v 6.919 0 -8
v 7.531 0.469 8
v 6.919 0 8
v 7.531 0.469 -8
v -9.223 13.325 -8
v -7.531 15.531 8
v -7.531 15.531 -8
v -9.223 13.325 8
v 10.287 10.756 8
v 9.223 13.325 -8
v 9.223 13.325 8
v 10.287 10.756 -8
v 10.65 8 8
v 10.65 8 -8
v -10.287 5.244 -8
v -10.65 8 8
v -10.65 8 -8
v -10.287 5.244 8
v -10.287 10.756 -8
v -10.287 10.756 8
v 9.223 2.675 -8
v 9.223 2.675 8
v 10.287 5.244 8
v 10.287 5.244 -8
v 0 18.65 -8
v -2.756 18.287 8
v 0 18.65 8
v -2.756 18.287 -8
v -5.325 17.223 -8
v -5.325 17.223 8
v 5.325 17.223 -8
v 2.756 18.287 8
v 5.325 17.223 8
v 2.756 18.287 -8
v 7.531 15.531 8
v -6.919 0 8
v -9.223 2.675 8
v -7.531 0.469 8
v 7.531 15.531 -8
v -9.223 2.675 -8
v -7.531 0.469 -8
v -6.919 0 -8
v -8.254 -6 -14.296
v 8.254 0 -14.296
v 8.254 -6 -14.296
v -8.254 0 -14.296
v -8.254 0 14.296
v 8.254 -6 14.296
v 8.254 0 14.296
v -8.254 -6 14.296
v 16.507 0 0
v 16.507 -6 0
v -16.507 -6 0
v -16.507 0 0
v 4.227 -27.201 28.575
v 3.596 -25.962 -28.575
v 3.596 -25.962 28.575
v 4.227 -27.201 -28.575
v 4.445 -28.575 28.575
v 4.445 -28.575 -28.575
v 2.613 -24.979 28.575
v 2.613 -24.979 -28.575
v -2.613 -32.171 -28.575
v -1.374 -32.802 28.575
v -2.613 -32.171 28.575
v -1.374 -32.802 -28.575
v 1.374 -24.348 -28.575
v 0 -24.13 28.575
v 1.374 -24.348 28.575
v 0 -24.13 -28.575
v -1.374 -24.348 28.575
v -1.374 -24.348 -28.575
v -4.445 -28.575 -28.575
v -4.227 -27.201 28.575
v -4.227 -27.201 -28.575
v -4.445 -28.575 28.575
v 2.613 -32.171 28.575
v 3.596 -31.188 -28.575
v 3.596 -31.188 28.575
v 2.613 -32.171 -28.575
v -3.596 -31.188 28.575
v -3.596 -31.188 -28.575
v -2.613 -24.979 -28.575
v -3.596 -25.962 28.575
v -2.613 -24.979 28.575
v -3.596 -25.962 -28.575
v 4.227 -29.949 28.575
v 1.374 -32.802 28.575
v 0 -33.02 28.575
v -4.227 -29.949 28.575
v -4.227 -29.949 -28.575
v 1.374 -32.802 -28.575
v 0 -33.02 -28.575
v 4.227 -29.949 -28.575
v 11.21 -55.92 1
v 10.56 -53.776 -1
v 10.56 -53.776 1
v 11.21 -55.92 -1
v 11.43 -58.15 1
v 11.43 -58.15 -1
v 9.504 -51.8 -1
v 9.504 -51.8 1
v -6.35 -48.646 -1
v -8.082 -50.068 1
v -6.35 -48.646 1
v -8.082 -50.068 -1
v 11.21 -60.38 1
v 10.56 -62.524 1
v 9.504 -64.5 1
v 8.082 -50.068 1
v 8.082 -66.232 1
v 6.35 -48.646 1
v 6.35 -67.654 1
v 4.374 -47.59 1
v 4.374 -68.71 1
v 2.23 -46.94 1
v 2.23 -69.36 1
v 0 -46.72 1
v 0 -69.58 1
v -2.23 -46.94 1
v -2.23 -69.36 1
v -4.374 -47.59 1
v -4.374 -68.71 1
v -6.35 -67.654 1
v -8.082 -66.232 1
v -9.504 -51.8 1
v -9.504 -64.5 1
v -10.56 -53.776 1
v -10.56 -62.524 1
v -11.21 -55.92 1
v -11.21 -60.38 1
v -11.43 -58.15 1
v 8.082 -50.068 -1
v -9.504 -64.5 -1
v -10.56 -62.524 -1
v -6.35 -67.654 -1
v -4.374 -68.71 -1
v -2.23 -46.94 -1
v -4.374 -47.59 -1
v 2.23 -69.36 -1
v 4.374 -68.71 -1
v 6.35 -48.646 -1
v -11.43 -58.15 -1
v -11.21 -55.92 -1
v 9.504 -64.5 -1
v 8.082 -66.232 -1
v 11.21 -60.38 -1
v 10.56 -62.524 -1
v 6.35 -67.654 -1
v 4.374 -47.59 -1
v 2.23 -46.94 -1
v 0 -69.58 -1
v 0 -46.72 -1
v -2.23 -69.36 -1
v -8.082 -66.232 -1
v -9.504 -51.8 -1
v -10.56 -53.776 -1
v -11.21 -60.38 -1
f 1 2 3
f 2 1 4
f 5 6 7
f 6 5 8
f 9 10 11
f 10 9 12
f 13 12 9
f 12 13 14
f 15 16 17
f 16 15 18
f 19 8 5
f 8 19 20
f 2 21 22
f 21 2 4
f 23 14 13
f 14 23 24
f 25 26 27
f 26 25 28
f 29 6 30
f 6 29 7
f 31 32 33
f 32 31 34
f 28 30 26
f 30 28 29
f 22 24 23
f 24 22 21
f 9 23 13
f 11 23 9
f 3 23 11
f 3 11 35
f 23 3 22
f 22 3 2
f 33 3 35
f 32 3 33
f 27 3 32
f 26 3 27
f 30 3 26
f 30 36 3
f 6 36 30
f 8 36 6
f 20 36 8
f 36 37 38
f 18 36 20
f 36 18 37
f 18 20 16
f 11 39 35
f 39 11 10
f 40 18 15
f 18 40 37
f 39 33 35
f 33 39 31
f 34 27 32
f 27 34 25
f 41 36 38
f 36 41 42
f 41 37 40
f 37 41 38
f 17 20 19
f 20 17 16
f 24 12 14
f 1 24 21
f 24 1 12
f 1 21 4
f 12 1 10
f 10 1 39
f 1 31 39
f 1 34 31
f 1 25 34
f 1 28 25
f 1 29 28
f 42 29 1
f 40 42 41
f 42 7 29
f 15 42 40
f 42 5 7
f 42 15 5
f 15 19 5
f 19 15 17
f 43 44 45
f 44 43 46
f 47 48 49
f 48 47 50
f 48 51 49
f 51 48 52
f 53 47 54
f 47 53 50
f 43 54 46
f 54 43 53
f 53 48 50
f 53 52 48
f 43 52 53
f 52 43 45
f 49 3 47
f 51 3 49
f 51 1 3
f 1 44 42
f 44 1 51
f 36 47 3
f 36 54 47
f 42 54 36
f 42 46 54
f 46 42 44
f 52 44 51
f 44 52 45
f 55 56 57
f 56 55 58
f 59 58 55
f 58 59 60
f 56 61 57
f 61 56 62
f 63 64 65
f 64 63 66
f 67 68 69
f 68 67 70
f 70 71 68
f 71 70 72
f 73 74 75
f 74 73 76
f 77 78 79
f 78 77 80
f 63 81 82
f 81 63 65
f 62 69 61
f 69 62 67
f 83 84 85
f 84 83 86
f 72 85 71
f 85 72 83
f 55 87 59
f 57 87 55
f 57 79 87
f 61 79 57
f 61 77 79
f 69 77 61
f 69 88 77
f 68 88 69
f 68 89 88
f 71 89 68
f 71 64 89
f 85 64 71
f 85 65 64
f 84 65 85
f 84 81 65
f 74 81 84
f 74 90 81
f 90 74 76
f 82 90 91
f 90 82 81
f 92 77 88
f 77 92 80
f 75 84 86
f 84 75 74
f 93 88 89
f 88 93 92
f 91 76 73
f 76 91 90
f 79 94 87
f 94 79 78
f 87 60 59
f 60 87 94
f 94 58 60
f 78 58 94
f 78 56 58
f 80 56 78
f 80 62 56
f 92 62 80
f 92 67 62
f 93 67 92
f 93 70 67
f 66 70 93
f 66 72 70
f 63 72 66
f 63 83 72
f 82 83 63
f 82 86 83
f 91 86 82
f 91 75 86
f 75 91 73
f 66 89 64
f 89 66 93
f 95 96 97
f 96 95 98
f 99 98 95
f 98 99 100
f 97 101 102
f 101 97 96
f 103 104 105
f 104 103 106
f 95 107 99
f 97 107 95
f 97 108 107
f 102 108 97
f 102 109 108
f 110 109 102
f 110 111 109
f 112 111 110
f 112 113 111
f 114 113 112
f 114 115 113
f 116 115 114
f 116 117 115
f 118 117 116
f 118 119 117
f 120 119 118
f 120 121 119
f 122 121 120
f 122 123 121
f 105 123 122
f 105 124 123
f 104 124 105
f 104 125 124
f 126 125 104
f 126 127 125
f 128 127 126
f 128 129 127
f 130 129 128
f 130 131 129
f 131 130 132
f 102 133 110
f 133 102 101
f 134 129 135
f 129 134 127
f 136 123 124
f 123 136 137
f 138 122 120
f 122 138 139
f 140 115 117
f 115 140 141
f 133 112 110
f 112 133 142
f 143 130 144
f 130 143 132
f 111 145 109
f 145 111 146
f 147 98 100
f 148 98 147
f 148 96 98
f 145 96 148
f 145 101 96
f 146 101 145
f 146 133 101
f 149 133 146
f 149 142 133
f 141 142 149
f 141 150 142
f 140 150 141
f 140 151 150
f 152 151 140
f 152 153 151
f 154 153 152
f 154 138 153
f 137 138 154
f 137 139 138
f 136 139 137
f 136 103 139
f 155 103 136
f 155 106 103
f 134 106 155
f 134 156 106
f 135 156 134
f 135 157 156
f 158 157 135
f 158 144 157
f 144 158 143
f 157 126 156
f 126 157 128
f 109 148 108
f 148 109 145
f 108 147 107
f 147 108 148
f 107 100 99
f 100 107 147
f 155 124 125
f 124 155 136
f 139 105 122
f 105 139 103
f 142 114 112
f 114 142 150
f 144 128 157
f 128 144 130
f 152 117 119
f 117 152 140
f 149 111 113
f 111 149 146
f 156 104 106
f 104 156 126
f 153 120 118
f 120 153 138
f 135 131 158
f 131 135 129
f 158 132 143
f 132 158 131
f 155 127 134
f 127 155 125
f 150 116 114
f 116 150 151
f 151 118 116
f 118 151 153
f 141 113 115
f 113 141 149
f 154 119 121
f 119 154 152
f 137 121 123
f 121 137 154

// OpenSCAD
// Auto-generated by scripts/author_from_manifest.py (Phase D.3).
// Source: data/phase_d_manifest.json (sku_intent='reliable-f1res58-pendent-175f').
// Do not hand-edit — regenerate from the manifest.
//
// @part reliable_f1res58_pendent_175f
// @kind sprinkler_head
// @category head.pendant.k58
// @display-name "Reliable F1Res 58 Residential Pendent K5.8 175°F"
// @mfg reliable_automatic_sprinkler
// @mfg-pn F1Res_58
// @listing UL FM
// @hazard-classes LH
// @price-usd 17.25
// @install-minutes 8
// @crew journeyman
// @k-factor 5.8
// @orientation pendant
// @response quick
// @temperature 175F
// @param size_in number default=0.5 label="Size" unit="in"
// @port inlet position=[0,0.014,0] direction=[0,1,0] style=NPT_threaded size_in=0.5 role=drop

size_in = 0.5;
k_factor = 5.8;

length_mm   = 57.15;
body_dia_mm = 25.40;
thread_od   = 21.3;
thread_len  = 16;
deflector_d = body_dia_mm * 0.9;

 union() {
    translate([0, thread_len/2, 0])
        cylinder(h = thread_len, d = thread_od, center = true, $fn = 24);
    translate([0, -3, 0])
        rotate([90, 0, 0])
        cylinder(h = 6, d = thread_od * 1.55, $fn = 6, center = true);
    translate([0, -length_mm/2, 0])
        cylinder(h = length_mm, d = body_dia_mm * 0.35, center = true, $fn = 20);
    translate([0, -length_mm - 1, 0])
        cylinder(h = 2, d = deflector_d, center = true, $fn = 32);
}
